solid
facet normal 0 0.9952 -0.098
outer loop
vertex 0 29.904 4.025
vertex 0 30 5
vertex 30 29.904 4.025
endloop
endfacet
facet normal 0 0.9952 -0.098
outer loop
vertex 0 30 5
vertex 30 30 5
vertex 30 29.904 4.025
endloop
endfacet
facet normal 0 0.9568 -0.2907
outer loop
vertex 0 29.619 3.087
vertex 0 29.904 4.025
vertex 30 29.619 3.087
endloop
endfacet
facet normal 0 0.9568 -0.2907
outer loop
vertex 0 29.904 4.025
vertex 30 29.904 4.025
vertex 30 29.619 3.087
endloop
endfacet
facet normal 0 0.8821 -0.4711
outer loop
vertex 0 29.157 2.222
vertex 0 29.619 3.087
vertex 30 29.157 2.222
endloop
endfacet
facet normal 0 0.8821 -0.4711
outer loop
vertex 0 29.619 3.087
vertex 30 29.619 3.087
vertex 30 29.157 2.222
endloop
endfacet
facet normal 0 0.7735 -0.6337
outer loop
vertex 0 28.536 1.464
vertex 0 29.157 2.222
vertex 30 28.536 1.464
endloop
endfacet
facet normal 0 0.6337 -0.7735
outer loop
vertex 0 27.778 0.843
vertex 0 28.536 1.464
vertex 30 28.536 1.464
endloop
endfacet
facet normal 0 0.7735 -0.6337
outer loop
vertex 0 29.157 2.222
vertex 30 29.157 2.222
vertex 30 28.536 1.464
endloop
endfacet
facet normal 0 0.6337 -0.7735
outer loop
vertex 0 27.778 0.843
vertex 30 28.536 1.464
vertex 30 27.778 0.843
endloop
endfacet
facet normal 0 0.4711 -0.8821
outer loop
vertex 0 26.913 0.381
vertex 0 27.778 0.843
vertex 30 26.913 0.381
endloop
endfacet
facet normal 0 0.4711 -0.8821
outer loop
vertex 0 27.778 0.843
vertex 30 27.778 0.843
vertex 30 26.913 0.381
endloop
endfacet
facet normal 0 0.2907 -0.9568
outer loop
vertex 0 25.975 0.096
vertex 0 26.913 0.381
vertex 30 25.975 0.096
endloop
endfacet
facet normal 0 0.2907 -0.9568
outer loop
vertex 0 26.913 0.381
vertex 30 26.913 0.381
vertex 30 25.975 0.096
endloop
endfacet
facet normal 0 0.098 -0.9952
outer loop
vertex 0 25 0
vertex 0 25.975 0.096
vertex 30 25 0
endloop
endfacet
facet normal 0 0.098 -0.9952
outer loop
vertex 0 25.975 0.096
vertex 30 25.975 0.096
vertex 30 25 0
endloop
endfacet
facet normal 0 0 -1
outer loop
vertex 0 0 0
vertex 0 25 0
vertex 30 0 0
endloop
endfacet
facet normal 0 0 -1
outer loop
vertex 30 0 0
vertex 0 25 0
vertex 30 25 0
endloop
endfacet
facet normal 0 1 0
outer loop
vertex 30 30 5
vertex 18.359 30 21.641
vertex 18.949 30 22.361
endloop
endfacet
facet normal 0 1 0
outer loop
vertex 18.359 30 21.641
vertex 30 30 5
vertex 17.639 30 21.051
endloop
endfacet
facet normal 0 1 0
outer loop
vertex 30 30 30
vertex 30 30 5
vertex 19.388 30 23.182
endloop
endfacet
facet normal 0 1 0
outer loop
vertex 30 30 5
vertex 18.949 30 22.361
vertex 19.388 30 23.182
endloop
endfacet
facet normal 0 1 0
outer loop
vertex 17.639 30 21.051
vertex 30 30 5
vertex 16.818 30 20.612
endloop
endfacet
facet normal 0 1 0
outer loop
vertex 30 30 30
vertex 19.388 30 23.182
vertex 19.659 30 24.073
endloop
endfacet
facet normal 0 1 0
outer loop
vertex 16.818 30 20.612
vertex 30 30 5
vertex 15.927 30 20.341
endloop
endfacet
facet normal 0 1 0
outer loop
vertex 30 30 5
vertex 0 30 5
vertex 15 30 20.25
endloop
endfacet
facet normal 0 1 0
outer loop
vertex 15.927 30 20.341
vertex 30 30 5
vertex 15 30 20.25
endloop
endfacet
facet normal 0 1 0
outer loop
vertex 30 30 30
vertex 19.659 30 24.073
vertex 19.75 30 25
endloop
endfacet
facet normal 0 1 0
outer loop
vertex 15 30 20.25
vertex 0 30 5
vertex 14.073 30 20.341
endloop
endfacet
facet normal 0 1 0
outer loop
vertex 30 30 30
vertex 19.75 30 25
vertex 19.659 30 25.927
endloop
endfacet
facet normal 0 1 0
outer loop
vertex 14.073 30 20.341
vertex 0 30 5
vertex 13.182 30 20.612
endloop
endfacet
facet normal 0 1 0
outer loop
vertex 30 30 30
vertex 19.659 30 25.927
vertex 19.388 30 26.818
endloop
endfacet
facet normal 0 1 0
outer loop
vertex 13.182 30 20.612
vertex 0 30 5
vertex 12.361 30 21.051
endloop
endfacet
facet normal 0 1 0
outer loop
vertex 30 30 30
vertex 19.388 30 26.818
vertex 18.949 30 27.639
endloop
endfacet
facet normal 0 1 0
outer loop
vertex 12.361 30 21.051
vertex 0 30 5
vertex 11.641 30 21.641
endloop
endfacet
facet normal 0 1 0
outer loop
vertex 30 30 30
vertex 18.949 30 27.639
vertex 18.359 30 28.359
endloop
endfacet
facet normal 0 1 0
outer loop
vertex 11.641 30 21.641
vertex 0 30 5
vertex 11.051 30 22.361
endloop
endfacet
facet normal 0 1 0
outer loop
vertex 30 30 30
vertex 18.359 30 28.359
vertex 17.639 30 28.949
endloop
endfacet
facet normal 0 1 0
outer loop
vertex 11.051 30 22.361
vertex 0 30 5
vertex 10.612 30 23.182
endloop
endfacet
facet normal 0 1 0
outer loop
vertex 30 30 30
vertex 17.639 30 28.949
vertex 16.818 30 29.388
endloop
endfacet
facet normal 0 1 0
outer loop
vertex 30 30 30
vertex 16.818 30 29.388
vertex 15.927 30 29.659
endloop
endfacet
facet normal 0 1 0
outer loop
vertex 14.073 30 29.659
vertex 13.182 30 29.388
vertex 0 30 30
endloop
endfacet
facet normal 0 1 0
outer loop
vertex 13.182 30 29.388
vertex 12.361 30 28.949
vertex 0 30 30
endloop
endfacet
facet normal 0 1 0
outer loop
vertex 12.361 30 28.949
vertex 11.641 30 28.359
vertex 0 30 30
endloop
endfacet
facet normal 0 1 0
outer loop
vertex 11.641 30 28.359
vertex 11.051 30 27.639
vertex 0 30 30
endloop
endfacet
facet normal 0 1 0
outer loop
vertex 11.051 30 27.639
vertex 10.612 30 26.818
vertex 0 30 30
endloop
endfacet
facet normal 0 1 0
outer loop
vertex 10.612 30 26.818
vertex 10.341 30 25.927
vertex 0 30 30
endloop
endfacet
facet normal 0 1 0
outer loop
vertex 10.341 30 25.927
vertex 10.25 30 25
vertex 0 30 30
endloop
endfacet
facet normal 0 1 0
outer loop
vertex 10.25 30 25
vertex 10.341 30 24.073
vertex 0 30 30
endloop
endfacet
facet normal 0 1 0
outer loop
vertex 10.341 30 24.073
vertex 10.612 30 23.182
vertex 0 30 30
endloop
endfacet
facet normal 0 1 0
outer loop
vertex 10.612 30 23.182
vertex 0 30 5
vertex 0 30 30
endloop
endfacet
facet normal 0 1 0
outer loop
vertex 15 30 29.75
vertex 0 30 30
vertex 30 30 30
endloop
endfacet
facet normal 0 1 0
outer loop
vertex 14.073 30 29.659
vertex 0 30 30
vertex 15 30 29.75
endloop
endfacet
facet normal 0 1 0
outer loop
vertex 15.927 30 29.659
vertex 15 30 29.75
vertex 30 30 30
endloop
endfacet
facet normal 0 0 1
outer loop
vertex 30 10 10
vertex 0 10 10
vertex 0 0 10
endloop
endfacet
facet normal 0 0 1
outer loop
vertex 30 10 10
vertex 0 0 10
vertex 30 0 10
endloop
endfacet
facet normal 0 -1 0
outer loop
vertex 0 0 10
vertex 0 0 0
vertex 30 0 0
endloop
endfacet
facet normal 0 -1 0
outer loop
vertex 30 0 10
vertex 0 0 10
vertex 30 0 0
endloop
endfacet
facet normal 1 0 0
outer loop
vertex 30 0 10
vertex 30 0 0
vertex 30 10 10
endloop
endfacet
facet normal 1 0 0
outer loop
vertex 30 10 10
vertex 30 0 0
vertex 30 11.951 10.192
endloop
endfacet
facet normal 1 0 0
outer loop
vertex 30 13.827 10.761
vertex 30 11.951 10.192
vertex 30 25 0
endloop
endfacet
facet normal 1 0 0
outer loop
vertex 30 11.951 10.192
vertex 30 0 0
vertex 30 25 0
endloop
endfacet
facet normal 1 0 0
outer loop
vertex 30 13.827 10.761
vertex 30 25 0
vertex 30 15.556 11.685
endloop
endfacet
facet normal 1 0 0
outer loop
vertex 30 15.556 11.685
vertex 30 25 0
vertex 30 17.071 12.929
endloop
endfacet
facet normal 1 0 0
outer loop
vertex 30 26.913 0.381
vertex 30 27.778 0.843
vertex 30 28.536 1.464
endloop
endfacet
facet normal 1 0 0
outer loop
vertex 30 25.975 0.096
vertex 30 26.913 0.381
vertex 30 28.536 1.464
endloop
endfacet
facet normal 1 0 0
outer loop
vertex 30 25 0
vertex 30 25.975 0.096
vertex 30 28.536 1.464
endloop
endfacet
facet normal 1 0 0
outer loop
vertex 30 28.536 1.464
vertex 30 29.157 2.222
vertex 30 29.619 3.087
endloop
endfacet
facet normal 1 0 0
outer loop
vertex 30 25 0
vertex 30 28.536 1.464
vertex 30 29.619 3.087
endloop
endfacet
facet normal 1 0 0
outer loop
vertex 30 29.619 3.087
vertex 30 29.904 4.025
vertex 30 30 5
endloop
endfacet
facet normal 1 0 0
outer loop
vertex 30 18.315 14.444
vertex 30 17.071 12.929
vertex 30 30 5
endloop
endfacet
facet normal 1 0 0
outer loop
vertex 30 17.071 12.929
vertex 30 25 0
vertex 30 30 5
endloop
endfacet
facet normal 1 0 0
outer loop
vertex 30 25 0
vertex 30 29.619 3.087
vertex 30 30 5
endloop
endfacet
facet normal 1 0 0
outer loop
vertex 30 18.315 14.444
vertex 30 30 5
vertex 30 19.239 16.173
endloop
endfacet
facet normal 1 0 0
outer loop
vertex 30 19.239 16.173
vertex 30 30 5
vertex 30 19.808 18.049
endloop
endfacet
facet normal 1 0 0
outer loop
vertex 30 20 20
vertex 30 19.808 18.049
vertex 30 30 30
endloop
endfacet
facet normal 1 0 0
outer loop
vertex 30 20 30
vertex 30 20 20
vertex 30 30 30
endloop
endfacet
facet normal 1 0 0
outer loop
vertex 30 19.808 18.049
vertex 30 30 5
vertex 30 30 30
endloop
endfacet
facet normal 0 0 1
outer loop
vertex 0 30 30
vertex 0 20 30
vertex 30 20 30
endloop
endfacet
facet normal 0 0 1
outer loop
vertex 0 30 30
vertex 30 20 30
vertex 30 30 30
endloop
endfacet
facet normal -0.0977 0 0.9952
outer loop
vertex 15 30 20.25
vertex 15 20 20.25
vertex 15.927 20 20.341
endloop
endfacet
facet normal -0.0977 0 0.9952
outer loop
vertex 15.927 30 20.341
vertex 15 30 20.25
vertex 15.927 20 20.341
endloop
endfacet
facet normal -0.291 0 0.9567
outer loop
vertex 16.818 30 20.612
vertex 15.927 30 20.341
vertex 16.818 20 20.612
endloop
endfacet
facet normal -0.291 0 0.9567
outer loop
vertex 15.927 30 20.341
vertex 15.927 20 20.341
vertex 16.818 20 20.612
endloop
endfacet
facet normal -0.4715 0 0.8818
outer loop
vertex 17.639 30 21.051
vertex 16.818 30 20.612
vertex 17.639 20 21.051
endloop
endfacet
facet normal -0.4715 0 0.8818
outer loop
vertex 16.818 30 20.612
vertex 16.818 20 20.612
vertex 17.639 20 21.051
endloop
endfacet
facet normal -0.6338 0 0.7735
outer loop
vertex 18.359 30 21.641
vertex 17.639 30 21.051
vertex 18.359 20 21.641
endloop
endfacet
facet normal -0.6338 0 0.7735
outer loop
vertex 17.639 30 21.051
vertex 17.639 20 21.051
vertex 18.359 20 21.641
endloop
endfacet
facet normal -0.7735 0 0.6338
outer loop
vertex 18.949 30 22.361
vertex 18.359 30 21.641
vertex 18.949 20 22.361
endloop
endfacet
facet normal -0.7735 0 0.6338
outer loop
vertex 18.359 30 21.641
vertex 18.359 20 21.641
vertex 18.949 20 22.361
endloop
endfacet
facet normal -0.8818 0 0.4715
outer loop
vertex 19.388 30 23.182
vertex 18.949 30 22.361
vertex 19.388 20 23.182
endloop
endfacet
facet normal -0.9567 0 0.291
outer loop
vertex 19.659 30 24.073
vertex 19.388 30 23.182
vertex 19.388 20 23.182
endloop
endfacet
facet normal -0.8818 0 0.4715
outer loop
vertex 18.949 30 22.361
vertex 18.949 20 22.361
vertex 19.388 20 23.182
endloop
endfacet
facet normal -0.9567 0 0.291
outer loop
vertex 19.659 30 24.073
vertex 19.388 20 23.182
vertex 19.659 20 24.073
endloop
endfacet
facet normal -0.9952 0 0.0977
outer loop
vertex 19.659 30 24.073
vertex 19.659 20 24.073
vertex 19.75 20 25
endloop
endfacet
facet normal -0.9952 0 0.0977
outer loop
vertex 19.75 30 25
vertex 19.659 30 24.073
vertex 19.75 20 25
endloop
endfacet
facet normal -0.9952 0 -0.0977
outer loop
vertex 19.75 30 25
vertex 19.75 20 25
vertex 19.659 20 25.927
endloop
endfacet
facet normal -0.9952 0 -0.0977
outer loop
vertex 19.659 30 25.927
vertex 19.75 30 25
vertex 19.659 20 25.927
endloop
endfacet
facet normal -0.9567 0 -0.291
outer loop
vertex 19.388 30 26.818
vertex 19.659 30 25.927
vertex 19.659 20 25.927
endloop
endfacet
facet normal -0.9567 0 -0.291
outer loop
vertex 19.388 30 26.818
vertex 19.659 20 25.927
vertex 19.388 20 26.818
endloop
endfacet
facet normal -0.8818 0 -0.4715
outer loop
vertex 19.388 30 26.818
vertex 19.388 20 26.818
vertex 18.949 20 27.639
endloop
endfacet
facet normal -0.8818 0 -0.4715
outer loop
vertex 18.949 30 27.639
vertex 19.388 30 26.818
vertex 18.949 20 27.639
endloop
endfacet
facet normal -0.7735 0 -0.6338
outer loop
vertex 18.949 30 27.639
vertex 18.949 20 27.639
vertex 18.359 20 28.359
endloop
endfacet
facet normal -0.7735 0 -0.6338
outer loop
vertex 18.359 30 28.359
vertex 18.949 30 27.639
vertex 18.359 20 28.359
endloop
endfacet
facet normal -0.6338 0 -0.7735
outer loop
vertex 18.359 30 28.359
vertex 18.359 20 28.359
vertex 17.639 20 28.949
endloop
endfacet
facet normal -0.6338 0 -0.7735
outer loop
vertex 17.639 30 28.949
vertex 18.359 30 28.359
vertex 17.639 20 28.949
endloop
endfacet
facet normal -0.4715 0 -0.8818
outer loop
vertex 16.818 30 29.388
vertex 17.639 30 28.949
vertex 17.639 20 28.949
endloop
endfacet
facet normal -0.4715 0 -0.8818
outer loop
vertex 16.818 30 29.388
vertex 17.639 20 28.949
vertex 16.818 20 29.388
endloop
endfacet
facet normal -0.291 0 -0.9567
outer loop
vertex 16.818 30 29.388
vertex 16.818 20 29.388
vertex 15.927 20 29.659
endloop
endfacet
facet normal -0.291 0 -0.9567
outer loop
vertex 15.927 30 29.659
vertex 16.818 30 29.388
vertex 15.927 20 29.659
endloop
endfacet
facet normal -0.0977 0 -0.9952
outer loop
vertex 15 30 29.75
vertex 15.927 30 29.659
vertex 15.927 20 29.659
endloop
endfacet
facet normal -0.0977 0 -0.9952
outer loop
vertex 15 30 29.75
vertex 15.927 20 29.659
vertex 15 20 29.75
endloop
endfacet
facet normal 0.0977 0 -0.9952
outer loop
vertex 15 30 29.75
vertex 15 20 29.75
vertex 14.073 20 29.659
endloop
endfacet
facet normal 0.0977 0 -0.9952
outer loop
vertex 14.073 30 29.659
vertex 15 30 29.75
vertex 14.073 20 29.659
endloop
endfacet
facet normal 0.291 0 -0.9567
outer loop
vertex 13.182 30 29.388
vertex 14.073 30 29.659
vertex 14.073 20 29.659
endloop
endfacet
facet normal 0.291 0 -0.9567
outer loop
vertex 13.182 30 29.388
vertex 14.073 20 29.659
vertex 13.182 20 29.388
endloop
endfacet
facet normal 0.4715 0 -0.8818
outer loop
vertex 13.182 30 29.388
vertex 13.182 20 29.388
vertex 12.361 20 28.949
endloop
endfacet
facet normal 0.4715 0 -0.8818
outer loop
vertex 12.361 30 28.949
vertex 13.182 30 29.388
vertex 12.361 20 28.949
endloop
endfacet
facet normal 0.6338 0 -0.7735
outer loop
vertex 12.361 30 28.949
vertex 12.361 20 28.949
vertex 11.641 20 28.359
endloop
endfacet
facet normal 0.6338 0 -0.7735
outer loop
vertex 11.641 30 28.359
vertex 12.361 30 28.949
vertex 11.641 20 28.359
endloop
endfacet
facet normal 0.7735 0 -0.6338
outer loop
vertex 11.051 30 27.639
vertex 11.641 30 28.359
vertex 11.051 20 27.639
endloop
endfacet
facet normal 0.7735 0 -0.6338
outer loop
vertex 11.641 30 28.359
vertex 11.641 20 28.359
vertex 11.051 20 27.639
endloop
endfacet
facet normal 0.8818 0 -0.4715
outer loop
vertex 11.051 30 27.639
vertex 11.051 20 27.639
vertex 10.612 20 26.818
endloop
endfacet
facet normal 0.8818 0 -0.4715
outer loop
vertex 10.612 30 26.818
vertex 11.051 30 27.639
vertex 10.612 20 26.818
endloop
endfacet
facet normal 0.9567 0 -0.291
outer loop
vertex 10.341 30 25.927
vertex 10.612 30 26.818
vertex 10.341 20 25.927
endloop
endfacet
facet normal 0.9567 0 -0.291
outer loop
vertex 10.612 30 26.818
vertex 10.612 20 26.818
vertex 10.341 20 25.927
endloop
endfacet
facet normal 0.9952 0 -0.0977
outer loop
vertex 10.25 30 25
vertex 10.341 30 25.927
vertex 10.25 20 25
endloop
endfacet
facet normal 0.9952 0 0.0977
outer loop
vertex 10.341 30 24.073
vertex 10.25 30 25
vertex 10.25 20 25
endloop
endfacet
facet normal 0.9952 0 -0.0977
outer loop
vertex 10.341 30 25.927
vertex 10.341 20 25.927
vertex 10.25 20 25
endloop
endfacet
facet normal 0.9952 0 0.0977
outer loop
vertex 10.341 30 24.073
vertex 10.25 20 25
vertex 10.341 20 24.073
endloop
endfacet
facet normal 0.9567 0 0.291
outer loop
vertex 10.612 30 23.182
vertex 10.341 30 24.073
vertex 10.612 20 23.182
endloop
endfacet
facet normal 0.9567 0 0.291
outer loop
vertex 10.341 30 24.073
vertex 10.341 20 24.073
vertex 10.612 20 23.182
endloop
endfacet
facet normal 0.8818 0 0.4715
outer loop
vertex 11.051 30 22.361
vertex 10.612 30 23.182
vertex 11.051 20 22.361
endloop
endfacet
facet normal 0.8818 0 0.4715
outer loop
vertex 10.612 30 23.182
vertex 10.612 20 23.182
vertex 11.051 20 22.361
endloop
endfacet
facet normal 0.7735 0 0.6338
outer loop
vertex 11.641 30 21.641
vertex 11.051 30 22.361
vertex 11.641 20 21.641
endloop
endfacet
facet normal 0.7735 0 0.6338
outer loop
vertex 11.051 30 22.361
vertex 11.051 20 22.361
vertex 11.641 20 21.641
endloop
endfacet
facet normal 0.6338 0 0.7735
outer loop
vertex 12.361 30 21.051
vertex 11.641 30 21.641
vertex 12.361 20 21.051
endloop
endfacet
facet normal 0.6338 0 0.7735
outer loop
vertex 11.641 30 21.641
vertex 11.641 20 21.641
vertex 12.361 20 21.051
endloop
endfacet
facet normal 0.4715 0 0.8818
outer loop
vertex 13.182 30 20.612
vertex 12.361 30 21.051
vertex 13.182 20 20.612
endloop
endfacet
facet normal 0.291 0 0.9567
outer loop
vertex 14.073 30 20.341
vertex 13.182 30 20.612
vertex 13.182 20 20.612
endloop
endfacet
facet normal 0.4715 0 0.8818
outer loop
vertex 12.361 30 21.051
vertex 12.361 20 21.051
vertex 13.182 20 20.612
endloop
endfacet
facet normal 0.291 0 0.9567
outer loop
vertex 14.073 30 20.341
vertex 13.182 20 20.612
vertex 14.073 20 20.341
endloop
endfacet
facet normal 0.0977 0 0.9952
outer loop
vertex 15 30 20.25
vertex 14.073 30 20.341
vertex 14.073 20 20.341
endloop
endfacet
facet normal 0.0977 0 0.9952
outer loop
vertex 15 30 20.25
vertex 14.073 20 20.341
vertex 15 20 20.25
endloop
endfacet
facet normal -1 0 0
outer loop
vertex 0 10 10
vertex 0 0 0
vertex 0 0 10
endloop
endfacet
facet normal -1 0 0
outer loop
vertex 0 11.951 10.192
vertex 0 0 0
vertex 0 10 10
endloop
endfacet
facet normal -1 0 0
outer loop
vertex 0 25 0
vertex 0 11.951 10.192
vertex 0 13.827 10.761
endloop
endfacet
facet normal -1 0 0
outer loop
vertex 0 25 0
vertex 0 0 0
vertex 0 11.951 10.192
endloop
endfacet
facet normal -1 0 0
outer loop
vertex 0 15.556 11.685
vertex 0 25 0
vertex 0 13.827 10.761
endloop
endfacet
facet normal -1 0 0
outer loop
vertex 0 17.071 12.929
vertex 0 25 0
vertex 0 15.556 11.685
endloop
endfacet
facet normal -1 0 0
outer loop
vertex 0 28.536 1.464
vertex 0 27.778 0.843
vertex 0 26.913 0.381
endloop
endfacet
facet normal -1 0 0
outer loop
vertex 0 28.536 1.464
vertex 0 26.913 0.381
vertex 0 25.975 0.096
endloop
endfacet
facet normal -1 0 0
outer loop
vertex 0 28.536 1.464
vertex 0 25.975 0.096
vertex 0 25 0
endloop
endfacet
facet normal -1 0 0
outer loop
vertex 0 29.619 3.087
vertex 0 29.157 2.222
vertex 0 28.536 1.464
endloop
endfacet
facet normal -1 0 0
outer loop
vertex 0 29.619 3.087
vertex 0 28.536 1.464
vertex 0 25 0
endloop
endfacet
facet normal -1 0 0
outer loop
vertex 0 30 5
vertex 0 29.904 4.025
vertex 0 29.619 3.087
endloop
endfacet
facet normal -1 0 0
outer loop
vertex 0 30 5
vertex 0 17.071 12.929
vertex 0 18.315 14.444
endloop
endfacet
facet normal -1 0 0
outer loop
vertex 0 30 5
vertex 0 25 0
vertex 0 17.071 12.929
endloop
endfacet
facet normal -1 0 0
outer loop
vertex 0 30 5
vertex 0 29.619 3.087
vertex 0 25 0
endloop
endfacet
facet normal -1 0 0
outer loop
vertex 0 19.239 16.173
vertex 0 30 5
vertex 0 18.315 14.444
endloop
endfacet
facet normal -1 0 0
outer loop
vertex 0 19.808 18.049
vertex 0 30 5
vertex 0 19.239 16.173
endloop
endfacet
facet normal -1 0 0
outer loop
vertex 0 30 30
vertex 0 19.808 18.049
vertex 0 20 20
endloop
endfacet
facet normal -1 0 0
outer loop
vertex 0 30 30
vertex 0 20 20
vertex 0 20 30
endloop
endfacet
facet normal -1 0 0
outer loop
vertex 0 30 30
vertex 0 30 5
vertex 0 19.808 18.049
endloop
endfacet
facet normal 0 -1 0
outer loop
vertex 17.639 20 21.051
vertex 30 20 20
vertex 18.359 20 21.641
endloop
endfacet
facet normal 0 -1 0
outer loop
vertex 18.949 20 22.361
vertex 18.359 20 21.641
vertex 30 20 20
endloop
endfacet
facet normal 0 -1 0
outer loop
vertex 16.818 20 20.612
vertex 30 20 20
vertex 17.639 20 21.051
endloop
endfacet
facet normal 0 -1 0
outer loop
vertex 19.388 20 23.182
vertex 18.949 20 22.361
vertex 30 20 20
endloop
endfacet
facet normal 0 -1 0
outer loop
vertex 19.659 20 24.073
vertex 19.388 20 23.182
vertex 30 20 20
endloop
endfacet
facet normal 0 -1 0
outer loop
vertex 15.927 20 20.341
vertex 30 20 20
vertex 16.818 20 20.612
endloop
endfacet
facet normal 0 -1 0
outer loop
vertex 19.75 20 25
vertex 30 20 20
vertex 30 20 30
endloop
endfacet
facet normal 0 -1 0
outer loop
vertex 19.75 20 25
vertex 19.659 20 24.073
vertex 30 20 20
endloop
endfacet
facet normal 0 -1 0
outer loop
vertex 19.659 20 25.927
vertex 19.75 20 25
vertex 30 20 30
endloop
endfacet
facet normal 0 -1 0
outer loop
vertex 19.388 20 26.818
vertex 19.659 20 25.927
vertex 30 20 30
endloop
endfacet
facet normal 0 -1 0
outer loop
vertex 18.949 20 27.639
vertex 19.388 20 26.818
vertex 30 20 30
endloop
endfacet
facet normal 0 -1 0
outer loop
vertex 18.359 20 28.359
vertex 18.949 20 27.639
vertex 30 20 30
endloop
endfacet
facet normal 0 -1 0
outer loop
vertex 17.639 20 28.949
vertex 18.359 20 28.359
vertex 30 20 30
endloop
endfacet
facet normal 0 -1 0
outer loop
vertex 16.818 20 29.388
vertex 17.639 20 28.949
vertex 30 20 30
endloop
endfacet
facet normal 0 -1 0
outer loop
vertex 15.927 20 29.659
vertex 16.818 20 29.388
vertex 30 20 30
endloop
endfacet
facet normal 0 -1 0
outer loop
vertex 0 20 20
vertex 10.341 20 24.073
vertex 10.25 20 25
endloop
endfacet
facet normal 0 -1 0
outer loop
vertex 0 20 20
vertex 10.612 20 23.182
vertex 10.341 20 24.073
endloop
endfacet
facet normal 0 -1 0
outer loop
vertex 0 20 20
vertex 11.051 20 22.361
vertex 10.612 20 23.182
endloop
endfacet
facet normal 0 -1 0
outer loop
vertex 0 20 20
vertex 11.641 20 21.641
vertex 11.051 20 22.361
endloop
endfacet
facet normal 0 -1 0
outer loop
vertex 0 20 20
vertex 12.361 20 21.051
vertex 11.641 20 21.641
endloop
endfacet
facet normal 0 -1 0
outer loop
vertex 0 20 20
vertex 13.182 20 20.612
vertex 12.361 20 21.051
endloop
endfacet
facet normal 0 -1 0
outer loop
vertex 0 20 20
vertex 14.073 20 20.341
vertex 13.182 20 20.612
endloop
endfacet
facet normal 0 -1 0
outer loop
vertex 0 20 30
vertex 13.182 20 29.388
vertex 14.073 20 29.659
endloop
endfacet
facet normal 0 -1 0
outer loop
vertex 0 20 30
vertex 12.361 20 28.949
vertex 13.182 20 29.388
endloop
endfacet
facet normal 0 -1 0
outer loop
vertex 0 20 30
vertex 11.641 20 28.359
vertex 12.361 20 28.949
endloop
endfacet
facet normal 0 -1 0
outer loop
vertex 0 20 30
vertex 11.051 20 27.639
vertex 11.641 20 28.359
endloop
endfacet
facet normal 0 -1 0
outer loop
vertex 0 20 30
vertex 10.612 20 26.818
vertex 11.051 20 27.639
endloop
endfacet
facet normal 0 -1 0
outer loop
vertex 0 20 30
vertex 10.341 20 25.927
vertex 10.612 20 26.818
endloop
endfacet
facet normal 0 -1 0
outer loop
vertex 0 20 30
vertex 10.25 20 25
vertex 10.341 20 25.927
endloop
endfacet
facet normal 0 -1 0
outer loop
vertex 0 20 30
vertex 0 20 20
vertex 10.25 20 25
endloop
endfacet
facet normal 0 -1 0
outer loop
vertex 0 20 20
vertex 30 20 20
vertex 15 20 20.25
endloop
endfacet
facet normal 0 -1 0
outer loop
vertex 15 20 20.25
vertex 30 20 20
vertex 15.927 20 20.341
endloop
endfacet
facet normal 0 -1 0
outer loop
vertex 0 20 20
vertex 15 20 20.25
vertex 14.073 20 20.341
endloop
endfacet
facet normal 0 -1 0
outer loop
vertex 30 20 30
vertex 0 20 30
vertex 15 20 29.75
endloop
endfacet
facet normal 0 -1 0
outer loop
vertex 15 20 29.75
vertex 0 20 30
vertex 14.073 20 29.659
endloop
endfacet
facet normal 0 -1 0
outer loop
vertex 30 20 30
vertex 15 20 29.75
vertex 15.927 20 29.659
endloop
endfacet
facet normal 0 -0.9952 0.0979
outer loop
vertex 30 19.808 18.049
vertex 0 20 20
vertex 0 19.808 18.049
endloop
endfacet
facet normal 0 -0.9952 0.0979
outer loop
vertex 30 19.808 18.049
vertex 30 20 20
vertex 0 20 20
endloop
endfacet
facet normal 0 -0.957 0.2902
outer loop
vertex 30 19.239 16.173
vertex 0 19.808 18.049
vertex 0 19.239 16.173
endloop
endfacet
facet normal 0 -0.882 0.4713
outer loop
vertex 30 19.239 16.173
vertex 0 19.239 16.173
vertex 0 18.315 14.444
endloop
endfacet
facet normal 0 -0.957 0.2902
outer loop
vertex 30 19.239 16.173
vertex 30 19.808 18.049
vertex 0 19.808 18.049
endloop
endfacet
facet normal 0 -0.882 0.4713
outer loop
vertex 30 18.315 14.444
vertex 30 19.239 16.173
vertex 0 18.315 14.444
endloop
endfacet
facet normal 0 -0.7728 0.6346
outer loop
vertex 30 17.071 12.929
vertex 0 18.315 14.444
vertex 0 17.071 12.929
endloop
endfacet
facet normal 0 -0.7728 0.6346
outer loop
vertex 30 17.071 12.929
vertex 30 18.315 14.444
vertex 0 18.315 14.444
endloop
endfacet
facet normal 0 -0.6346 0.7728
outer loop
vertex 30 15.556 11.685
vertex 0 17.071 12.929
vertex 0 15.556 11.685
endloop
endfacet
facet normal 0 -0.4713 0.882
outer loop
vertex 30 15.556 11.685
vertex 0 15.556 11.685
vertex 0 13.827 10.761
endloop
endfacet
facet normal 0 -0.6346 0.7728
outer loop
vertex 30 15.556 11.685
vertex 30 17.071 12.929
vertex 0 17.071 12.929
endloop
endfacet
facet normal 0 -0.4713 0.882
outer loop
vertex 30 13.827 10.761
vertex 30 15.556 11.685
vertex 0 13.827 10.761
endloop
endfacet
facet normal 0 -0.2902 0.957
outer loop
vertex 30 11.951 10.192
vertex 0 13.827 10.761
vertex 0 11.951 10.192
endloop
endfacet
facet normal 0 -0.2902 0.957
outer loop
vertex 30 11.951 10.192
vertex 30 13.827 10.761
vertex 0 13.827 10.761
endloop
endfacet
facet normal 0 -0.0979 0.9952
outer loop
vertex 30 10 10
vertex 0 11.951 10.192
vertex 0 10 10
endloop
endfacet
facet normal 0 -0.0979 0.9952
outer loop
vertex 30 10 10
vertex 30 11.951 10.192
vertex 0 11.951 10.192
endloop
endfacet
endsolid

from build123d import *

# Parameters (mm, degrees)
SKETCH1_W           = 30
SKETCH1_H           = 30
BOSS_EXTRUDE3_DEPTH = 10
SKETCH2_W           = 20
SKETCH2_H           = 10
BOSS_EXTRUDE5_DEPTH = 30
FILLET1_R           = 10
SKETCH8_R           = 4.75
CUT_EXTRUDE6_DEPTH  = 47.904157598
FILLET3_R           = 5


with BuildPart() as part:
    # Sketch1 → Boss-Extrude3 (new body)
    with BuildSketch(Plane.XY):
        with Locations((15, 15)):
            Rectangle(SKETCH1_W, SKETCH1_H)
    extrude(amount=BOSS_EXTRUDE3_DEPTH)

    # Sketch2 → Boss-Extrude5 (add)
    with BuildSketch(Plane.ZY):
        with Locations((20, 25)):
            Rectangle(SKETCH2_W, SKETCH2_H)
    extrude(amount=-BOSS_EXTRUDE5_DEPTH)

    # Fillet1
    fillet1_edges = [part.edges().sort_by_distance(p)[0] for p in [
        (15, 20, 10),
    ]]
    fillet(fillet1_edges, radius=FILLET1_R)

    # Sketch8 → Cut-Extrude6 (cut, through all)
    with BuildSketch(Plane.XZ.offset(-20)):
        with Locations(Location((15, 25, 0), (0, 0, 270))):
            Circle(SKETCH8_R)
    extrude(amount=-CUT_EXTRUDE6_DEPTH, mode=Mode.SUBTRACT)

    # Fillet3
    fillet3_edges = [part.edges().sort_by_distance(p)[0] for p in [
        (15, 30, 0),
    ]]
    fillet(fillet3_edges, radius=FILLET3_R)


solid = part.part
